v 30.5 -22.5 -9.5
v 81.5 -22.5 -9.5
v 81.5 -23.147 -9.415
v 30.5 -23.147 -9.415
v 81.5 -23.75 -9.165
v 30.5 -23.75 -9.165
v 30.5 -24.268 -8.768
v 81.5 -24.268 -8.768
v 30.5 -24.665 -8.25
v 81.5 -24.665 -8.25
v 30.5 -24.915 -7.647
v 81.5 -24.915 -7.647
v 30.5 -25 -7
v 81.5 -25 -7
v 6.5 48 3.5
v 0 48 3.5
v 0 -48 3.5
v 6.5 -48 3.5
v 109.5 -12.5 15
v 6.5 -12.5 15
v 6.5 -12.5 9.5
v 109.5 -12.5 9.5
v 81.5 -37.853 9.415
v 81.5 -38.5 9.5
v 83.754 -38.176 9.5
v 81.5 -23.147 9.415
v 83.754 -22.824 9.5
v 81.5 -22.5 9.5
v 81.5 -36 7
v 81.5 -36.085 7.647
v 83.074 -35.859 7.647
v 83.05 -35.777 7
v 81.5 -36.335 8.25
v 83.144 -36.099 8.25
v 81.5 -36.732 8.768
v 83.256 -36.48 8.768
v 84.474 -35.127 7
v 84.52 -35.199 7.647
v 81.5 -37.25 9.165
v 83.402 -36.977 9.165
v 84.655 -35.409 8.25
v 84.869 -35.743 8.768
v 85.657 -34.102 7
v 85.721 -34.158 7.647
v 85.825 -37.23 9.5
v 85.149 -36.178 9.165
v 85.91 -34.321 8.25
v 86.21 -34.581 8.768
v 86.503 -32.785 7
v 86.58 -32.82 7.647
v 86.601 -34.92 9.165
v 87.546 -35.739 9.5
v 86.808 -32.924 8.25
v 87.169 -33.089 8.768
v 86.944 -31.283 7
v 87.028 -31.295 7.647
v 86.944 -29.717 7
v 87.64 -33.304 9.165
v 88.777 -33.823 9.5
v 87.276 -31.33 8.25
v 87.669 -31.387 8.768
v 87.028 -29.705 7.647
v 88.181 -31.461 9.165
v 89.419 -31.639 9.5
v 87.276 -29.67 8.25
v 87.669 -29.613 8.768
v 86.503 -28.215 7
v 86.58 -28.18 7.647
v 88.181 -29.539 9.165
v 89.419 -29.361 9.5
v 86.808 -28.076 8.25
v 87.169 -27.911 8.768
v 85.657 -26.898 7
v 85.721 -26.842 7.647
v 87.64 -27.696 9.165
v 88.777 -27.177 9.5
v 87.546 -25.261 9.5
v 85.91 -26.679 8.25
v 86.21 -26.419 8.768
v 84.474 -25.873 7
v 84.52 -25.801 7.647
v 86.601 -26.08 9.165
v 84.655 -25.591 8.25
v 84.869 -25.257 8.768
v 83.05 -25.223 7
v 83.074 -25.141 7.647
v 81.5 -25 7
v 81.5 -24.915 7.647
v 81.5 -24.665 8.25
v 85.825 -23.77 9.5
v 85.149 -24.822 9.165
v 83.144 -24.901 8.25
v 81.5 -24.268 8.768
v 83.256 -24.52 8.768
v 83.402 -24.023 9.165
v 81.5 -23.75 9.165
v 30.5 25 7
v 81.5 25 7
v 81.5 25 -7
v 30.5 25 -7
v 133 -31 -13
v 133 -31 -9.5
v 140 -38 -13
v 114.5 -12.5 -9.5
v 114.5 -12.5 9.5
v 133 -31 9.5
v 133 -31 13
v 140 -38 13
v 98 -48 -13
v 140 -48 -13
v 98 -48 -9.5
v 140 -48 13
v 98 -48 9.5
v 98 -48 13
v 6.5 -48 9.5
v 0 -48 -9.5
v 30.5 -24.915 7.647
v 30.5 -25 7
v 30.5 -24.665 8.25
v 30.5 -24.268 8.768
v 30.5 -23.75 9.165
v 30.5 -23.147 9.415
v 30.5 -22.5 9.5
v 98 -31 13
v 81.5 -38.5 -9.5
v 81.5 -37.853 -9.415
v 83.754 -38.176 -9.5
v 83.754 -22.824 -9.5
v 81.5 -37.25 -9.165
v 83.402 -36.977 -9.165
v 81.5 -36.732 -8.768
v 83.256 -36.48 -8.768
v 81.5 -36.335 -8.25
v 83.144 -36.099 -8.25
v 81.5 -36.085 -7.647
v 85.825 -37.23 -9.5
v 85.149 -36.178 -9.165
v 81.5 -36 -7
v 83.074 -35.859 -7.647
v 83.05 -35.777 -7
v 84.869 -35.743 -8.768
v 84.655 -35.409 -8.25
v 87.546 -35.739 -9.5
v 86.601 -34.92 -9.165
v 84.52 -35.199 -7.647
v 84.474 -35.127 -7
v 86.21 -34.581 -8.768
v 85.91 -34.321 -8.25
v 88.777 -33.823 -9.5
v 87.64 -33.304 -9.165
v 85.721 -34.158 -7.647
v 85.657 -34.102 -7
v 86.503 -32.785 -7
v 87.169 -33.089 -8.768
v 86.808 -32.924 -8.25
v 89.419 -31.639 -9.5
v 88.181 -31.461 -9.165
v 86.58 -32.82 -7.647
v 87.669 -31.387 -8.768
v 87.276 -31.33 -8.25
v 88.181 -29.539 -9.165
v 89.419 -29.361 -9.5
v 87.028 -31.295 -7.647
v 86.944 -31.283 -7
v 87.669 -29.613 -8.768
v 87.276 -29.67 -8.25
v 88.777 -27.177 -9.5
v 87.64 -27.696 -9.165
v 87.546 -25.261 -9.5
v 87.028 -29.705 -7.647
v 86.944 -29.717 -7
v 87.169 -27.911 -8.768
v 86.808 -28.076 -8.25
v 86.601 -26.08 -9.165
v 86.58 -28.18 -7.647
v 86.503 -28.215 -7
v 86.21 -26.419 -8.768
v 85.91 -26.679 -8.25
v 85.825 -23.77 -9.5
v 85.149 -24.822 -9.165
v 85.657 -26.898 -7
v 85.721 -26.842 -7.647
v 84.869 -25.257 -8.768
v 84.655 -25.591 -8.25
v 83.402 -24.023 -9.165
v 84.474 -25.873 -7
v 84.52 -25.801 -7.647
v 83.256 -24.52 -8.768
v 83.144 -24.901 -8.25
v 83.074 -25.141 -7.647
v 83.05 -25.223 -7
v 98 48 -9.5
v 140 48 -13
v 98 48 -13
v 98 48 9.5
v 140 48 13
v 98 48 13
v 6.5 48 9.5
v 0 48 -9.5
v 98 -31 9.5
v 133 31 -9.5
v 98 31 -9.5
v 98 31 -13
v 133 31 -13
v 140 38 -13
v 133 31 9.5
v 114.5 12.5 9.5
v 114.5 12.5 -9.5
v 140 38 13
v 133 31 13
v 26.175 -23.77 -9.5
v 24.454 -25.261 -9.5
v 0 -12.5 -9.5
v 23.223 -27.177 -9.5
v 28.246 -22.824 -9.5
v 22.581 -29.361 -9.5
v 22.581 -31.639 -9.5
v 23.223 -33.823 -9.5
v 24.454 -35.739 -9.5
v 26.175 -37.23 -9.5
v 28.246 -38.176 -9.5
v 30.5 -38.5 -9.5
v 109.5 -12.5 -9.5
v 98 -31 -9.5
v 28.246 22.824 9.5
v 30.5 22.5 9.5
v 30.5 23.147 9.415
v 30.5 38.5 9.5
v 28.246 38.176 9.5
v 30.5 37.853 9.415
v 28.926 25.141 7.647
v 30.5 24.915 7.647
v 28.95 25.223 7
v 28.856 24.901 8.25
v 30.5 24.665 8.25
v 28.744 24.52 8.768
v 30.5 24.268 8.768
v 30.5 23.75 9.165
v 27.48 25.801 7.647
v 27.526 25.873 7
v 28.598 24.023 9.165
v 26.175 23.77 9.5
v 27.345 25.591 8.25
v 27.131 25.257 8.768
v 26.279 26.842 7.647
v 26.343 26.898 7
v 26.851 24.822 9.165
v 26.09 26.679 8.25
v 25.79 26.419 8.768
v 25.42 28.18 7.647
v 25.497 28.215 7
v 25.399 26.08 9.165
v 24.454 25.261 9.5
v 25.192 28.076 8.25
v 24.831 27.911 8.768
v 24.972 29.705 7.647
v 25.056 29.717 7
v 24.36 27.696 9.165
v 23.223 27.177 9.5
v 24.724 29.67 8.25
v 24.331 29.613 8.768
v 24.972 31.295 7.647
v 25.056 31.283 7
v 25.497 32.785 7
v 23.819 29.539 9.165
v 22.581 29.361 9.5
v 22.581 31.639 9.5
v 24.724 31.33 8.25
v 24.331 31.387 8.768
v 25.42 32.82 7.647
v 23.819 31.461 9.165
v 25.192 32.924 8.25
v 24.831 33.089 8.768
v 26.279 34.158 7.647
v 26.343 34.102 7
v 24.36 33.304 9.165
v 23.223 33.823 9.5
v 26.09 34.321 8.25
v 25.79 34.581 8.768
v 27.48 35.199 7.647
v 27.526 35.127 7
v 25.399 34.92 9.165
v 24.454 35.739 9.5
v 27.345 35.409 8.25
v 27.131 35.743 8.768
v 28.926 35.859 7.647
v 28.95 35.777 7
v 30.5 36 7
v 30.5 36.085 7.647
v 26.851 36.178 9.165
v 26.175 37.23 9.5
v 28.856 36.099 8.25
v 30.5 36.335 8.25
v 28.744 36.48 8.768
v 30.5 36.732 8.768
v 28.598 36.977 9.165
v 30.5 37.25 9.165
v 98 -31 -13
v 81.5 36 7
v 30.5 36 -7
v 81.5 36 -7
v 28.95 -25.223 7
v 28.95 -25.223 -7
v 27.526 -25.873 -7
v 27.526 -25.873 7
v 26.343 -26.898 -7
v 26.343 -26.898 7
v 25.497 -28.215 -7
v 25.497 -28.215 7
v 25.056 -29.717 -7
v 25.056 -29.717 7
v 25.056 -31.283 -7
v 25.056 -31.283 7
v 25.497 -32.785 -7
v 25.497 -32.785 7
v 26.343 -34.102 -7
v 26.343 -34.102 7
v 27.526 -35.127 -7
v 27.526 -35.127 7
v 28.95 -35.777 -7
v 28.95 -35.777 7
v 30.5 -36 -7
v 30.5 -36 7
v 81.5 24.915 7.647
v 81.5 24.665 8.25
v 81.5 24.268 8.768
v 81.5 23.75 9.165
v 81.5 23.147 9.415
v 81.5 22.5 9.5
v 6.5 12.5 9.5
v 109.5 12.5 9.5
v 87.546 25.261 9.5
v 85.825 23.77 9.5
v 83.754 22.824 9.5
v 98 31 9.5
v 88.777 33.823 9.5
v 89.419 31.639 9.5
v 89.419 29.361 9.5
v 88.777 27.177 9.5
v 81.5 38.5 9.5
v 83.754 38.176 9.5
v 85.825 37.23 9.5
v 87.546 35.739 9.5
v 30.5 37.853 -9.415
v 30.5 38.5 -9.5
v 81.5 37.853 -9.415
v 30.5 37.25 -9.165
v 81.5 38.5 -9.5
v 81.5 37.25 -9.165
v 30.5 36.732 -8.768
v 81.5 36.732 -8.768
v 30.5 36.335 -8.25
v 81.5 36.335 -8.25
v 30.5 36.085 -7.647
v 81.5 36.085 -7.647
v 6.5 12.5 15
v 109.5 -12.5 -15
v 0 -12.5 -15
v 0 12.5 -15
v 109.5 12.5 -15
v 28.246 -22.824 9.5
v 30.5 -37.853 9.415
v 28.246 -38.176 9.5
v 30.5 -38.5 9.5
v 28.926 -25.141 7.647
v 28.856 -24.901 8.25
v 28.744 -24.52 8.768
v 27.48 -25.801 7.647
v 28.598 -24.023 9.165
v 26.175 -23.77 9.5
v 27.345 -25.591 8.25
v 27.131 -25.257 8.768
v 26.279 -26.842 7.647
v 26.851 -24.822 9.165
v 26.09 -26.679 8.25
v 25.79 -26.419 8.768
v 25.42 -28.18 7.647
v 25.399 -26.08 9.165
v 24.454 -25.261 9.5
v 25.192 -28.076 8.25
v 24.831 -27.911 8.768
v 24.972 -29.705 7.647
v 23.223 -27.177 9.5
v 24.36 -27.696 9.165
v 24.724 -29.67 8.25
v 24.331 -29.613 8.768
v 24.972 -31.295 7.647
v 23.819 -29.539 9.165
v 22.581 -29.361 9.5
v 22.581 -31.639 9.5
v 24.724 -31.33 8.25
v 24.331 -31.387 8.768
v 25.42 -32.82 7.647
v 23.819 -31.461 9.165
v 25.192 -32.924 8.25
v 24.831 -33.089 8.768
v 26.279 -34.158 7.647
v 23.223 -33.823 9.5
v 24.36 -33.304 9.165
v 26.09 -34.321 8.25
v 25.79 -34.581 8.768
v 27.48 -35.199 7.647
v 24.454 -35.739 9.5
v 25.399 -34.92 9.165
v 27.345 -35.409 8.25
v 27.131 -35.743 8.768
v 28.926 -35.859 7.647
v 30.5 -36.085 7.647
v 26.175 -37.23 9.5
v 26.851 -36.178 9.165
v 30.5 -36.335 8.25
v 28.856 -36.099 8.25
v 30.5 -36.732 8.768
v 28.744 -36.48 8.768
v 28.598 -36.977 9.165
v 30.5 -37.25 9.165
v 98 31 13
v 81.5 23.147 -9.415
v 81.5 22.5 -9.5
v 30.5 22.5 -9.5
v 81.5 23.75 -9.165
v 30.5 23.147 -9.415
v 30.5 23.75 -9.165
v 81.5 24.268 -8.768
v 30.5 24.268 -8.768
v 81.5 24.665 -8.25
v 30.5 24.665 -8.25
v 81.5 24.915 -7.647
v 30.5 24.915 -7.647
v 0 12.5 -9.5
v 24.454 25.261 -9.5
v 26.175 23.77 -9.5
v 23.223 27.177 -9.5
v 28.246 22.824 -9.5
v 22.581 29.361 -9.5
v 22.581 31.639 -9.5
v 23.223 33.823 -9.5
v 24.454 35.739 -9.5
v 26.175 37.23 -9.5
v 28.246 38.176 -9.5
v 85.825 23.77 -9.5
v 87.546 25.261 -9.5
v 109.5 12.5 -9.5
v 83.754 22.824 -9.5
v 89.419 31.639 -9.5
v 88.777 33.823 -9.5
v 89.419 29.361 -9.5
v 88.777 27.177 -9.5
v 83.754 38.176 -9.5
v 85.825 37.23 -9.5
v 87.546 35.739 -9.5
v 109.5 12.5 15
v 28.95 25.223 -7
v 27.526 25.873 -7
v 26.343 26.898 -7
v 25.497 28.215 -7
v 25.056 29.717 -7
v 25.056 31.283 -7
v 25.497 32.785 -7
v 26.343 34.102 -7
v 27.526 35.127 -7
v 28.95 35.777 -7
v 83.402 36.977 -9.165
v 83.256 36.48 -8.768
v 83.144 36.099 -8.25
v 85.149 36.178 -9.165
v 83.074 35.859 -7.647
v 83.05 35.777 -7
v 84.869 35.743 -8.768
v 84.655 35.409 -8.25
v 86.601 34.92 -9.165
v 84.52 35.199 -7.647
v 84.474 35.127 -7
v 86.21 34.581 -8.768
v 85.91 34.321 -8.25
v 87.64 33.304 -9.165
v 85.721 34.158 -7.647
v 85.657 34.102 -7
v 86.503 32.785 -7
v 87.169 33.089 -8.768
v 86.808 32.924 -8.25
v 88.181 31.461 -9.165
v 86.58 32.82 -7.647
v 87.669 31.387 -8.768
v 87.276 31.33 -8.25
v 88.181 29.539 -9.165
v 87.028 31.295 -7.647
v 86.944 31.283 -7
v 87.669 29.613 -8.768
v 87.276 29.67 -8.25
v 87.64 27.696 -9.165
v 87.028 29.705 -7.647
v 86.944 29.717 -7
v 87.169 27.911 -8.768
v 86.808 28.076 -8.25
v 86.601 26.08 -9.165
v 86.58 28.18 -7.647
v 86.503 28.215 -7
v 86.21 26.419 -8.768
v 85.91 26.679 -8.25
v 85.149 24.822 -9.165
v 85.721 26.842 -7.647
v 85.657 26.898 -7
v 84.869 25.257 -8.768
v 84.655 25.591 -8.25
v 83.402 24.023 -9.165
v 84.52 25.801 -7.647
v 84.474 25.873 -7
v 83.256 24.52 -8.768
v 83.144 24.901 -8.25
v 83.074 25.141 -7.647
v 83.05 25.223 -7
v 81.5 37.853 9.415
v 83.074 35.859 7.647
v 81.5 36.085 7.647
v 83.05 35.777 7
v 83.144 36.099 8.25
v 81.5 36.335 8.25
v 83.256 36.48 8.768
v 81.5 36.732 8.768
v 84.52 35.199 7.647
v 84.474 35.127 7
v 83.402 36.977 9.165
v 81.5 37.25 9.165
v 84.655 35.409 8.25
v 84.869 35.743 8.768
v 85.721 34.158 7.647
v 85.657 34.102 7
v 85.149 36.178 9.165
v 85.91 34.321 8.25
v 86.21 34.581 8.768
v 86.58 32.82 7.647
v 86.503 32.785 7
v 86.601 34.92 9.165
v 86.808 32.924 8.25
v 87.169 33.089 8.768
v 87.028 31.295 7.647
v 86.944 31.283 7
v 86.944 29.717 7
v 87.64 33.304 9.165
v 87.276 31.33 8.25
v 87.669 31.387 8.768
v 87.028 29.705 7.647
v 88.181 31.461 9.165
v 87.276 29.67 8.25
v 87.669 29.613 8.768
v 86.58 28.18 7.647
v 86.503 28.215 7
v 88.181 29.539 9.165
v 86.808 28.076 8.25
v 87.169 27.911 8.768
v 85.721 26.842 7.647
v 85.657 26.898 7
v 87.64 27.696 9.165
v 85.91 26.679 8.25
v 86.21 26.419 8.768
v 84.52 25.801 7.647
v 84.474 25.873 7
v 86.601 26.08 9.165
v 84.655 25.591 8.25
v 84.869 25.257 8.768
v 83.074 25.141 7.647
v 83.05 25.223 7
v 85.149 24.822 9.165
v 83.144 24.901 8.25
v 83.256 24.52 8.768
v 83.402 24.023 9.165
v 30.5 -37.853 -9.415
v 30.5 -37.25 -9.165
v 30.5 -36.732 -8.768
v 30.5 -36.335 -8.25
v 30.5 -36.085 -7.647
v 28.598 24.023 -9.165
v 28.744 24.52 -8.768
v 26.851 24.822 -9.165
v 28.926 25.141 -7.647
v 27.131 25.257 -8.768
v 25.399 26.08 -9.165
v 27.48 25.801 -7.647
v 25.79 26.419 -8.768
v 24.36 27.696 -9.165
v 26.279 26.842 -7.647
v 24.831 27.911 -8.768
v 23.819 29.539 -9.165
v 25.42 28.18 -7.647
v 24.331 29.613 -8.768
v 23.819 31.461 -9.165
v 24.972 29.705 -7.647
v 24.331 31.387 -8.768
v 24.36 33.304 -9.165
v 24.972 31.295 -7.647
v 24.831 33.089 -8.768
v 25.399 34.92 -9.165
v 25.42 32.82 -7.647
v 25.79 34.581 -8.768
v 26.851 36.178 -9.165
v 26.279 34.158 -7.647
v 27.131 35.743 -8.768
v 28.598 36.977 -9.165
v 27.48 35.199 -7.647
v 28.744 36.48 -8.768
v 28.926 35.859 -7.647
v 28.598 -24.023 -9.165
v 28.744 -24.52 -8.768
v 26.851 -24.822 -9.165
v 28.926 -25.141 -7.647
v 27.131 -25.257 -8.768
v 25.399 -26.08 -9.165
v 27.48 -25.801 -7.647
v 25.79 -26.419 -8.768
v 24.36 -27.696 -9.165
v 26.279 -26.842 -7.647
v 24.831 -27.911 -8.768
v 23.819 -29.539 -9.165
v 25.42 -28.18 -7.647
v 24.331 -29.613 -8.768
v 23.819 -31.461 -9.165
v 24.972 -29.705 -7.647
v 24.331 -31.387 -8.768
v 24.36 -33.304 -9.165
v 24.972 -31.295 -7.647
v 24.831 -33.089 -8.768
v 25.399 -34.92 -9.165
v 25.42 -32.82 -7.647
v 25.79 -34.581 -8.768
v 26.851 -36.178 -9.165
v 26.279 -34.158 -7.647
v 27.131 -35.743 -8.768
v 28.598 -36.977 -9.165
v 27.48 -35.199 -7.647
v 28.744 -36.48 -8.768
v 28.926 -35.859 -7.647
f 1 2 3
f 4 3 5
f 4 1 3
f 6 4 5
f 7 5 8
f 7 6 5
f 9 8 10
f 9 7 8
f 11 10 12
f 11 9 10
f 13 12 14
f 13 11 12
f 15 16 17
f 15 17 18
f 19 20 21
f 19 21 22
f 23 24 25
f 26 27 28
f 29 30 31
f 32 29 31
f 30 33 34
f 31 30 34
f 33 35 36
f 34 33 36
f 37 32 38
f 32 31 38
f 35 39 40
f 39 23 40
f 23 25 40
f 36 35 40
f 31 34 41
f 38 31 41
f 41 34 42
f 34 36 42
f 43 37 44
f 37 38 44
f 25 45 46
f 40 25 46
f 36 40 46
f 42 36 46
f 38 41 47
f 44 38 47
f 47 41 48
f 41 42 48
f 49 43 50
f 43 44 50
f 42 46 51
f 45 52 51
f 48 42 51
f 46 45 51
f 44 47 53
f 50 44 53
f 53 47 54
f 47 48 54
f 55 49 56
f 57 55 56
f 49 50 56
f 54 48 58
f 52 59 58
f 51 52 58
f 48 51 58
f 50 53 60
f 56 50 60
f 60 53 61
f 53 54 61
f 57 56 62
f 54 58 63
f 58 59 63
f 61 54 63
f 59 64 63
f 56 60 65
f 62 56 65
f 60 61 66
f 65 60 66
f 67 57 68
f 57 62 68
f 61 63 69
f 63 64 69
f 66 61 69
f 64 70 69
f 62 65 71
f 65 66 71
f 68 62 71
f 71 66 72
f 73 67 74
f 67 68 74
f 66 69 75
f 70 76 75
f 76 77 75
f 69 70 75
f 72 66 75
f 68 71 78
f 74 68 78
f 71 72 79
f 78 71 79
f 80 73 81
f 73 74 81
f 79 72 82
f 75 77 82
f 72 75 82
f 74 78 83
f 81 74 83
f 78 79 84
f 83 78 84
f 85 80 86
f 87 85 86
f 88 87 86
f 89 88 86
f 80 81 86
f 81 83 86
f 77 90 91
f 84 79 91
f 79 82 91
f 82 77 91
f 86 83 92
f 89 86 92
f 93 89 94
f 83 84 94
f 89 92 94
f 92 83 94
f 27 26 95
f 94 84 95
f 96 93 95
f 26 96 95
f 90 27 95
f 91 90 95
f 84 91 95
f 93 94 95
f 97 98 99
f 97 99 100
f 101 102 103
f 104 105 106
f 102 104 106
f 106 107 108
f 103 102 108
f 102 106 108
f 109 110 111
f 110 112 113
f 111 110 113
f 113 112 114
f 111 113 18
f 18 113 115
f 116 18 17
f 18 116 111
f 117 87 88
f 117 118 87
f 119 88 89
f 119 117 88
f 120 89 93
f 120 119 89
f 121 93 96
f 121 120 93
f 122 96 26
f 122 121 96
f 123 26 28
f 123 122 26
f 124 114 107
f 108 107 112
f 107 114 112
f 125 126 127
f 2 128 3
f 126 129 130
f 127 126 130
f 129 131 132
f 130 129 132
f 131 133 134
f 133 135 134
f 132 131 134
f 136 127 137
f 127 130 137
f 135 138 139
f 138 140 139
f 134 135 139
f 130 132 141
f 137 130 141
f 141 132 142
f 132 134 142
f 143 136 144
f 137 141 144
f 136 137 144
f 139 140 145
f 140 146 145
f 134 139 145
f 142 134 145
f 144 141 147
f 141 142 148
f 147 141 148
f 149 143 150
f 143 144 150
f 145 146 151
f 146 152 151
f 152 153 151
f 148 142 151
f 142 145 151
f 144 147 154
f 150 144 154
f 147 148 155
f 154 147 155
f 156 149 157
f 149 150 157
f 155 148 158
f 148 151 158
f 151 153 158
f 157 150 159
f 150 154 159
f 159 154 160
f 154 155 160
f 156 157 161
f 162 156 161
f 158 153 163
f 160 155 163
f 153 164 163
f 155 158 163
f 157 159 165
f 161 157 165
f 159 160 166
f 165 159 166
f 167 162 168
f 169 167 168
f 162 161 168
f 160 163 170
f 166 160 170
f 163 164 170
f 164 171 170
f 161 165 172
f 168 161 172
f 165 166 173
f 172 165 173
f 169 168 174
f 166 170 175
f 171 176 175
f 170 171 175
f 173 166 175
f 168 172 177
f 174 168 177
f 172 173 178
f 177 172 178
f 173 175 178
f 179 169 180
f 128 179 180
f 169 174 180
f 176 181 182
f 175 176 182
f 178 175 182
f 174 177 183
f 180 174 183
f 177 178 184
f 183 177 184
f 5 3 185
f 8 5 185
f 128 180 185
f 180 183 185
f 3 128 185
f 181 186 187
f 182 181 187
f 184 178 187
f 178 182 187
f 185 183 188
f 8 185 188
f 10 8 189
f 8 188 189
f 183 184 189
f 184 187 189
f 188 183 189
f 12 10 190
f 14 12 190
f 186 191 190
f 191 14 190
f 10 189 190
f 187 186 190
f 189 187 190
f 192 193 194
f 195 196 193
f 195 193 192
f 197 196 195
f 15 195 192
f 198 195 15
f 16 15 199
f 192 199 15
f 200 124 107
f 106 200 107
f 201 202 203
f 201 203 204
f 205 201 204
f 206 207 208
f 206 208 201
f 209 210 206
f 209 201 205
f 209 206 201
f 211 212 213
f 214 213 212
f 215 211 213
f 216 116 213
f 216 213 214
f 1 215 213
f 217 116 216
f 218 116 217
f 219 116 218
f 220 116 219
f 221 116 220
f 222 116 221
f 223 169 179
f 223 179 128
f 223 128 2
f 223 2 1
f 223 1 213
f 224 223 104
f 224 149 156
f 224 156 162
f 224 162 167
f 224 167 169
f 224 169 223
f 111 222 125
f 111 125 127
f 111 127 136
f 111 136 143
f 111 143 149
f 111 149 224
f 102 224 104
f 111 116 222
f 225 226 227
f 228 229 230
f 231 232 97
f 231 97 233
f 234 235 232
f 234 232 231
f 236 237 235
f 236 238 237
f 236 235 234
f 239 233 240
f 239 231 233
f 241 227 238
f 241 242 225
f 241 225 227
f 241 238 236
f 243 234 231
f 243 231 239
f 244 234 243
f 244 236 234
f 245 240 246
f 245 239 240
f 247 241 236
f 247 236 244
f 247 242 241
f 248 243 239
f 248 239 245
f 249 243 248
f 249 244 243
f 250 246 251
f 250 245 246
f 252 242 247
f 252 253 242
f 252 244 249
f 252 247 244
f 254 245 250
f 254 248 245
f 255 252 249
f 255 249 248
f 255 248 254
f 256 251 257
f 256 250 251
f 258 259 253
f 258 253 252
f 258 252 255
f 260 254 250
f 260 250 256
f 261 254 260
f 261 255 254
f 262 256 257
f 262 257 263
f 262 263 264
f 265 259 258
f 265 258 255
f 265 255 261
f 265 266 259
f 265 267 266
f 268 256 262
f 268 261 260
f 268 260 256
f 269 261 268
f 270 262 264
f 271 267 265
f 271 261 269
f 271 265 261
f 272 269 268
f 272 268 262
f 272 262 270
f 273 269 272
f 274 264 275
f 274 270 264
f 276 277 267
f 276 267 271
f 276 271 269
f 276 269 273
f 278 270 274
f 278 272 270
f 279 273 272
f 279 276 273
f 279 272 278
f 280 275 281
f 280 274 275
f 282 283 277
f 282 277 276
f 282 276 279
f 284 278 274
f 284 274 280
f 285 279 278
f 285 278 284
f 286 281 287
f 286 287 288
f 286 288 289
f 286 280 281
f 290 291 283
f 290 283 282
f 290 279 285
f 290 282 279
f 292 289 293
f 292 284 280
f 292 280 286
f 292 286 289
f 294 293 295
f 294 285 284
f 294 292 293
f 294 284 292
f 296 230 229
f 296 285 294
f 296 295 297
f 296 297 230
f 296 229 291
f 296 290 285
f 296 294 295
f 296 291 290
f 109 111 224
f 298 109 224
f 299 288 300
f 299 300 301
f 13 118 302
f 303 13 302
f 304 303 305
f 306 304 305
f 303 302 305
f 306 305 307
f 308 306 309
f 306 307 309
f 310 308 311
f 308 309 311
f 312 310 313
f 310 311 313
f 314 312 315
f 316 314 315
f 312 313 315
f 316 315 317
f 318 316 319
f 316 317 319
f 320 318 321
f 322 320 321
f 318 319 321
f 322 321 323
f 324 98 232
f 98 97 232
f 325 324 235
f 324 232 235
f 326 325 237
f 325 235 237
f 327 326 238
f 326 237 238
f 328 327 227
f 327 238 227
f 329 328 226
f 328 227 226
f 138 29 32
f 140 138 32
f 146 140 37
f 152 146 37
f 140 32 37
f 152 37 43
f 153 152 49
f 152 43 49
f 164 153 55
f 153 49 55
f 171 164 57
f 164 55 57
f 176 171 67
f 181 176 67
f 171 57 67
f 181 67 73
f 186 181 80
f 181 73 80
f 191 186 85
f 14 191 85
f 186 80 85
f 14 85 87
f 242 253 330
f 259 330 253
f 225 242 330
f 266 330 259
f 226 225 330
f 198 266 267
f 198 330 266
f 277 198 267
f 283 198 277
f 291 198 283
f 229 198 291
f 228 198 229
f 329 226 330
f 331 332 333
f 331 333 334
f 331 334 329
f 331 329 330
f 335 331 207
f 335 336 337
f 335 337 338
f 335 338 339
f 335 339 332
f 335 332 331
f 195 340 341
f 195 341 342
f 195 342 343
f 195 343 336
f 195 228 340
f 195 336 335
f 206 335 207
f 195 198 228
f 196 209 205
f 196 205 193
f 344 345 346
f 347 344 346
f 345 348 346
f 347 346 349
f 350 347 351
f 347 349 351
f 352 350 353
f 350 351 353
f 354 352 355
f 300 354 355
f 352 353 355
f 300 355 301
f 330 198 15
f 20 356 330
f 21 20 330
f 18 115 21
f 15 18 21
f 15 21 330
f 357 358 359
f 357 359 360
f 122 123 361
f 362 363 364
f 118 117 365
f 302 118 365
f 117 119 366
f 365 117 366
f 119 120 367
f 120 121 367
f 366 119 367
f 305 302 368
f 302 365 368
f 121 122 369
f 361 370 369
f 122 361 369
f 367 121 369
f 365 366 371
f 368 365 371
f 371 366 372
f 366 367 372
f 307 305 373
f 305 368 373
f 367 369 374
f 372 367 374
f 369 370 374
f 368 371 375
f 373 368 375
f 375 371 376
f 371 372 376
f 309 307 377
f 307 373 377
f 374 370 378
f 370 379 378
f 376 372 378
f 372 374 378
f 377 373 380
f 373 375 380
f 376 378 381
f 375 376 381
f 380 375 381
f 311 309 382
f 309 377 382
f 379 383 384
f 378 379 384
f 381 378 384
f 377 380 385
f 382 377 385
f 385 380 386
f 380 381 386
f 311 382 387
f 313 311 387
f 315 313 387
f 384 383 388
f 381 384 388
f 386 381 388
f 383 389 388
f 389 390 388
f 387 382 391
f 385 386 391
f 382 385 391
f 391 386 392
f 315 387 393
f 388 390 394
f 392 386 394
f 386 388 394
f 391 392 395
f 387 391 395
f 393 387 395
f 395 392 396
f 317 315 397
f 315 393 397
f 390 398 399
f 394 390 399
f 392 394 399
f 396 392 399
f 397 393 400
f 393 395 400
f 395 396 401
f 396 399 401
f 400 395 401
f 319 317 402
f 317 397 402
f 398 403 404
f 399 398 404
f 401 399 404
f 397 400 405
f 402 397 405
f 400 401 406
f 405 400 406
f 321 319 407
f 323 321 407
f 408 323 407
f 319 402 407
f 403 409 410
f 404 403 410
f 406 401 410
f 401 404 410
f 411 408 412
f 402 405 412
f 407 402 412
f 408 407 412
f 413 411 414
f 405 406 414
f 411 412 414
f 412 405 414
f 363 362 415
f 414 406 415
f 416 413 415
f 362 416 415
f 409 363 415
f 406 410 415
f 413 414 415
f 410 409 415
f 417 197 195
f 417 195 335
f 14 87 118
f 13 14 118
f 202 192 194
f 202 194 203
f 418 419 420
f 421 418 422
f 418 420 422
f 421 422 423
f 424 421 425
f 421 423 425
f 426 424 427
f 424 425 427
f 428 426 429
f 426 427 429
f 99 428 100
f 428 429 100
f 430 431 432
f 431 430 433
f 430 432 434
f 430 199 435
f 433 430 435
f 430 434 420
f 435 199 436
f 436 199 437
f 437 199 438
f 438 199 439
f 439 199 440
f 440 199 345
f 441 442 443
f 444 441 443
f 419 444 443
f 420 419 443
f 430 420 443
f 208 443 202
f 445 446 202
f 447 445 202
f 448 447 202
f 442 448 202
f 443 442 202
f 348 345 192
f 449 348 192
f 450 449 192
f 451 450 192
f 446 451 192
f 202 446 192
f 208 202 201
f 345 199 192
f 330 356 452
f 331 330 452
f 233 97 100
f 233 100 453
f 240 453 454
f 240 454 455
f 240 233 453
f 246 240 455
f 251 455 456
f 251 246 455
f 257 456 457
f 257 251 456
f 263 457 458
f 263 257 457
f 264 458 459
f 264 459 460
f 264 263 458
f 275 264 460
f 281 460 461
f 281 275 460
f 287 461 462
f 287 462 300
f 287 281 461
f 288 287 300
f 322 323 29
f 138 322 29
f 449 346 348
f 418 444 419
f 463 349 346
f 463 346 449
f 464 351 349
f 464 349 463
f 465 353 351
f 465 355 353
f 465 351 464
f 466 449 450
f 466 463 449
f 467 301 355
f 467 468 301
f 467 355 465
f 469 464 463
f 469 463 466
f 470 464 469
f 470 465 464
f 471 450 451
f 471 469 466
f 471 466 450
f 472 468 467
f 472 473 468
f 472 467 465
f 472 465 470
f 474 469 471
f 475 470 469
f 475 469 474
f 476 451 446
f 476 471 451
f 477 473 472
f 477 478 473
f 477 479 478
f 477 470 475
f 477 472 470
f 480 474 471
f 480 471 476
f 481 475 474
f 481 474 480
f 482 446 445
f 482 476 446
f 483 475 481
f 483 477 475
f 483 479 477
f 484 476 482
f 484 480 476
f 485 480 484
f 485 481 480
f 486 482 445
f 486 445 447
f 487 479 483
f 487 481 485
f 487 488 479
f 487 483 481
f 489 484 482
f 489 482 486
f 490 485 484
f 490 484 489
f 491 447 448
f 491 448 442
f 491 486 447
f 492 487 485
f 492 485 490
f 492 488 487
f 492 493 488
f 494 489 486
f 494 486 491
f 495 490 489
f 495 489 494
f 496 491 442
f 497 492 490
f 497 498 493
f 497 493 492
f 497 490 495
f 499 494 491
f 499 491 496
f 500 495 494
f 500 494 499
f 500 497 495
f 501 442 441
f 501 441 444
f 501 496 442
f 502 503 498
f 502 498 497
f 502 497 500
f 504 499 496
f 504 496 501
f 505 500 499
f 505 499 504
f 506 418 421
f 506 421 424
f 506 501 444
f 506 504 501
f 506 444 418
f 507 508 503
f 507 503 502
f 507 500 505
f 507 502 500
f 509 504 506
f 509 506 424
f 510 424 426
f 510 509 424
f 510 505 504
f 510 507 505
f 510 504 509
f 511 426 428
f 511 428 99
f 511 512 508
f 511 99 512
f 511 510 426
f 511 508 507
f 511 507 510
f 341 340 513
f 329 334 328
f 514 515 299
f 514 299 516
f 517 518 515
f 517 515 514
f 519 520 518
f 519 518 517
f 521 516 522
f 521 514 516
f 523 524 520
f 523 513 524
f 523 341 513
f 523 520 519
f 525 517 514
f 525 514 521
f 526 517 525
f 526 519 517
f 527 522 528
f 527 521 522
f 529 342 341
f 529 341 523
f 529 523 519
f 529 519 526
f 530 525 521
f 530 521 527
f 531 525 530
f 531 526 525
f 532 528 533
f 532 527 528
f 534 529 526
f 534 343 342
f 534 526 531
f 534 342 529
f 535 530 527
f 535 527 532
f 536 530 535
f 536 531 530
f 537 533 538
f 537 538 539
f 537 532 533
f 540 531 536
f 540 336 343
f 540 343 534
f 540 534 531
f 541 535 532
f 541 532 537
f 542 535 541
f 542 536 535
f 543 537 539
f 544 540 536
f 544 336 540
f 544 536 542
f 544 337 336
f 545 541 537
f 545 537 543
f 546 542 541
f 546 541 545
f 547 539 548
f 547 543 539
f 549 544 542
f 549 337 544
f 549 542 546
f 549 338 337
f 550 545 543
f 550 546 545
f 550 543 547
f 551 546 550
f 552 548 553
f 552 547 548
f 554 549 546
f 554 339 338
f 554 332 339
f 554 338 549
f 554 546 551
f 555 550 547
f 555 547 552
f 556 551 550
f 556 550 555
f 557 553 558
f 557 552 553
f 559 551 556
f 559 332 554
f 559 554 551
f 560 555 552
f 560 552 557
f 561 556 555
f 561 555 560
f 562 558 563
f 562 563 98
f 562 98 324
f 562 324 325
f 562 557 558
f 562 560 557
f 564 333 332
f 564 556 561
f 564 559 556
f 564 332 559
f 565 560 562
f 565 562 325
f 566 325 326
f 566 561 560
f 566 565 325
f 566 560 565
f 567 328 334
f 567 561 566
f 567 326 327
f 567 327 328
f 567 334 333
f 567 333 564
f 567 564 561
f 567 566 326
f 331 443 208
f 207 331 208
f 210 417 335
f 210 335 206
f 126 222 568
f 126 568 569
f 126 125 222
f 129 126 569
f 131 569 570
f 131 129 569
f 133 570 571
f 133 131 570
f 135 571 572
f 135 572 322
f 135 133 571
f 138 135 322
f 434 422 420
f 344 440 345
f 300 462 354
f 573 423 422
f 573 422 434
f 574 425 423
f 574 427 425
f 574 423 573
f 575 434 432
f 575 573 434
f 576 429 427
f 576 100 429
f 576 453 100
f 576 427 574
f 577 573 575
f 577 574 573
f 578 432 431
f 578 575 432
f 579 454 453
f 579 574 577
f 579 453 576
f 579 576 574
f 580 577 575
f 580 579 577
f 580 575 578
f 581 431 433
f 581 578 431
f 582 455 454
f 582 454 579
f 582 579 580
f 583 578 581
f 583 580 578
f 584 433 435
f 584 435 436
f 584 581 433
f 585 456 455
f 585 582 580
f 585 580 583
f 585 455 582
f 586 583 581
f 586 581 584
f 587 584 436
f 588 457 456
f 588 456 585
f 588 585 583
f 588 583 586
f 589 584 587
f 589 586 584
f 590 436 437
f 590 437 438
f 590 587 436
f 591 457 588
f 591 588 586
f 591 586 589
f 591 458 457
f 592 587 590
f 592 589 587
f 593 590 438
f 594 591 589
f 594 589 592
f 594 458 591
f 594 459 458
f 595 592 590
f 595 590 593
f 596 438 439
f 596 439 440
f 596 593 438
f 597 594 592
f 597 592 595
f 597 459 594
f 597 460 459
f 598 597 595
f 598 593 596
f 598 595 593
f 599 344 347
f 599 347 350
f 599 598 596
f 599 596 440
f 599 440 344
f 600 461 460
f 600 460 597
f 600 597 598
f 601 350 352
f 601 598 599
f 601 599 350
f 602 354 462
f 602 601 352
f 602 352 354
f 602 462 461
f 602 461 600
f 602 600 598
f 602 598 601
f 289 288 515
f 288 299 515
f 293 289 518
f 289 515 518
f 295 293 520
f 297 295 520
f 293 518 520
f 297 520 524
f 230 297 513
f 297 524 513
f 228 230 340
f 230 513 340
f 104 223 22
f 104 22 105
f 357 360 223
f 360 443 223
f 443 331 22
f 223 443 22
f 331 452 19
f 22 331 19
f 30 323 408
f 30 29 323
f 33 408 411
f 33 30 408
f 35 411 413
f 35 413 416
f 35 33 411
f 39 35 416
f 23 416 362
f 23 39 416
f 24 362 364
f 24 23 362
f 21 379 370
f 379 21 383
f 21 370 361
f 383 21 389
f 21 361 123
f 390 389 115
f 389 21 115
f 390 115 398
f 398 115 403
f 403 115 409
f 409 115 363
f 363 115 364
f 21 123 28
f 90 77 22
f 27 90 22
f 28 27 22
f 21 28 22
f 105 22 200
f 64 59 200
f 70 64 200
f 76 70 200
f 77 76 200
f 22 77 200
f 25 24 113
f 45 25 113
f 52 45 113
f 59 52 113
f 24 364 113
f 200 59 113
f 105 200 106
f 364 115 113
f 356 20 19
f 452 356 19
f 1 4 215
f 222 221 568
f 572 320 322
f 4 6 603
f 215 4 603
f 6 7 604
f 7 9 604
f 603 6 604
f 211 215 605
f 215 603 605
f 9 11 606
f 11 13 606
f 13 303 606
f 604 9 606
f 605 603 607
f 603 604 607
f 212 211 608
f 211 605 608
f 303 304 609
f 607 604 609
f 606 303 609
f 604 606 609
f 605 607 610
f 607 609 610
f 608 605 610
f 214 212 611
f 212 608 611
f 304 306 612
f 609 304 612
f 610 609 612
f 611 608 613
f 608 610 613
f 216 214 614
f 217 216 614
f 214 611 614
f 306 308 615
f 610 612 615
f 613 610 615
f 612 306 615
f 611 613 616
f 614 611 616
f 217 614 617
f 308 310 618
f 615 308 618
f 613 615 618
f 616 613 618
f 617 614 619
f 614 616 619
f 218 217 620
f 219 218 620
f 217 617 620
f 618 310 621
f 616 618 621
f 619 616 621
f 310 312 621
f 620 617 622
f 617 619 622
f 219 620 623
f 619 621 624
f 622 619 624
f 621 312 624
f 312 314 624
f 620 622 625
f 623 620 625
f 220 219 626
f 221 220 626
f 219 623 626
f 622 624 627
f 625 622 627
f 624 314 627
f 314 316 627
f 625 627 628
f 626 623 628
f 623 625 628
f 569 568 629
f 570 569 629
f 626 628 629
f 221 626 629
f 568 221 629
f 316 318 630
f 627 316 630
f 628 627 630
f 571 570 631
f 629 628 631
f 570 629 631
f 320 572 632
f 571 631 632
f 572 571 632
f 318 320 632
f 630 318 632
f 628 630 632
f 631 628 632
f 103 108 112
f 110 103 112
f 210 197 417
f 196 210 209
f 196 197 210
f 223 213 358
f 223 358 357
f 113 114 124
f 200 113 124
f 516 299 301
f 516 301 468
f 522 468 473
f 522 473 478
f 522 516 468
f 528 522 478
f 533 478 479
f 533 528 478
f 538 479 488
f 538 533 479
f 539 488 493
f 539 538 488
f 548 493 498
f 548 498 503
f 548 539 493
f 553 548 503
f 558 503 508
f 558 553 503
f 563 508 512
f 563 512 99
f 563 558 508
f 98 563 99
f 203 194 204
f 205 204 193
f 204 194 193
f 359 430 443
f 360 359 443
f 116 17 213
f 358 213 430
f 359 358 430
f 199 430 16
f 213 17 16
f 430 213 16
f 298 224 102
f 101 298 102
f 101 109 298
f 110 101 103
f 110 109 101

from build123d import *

# Parameters (mm, degrees)
SKETCH1_W           = 109.5
SKETCH1_H           = 12.5
BOSS_EXTRUDE1_DEPTH = 15
BOSS_EXTRUDE2_DEPTH = 9.5
BOSS_EXTRUDE3_DEPTH = 13
SKETCH2_W           = 6.5
SKETCH2_H           = 11.5
CUT_EXTRUDE1_DEPTH  = 149.758193052
FILLET1_R           = 2.5


with BuildPart() as part:
    # Sketch1 → Boss-Extrude1 (new, symmetric)
    with BuildSketch(Plane.XY):
        with Locations((54.75, 6.25)):
            Rectangle(SKETCH1_W, SKETCH1_H)
    extrude(amount=BOSS_EXTRUDE1_DEPTH, both=True)

    # Sketch1<3> → Boss-Extrude2 (add, symmetric)
    with BuildSketch(Plane.XY):
        Polygon((0, 12.5), (109.5, 12.5), (114.5, 12.5), (133, 31), (98, 31), (98, 48), (0, 48), align=None)
        with BuildLine():
            ThreePointArc((30.5, 25), (25, 30.5), (30.5, 36))
            Line((30.5, 36), (81.5, 36))
            ThreePointArc((81.5, 36), (87, 30.5), (81.5, 25))
            Line((81.5, 25), (30.5, 25))
        make_face(mode=Mode.SUBTRACT)
    extrude(amount=BOSS_EXTRUDE2_DEPTH, both=True)

    # Sketch1<4> → Boss-Extrude3 (add, symmetric)
    with BuildSketch(Plane.XY):
        Polygon((98, 31), (133, 31), (140, 38), (140, 48), (98, 48), align=None)
    extrude(amount=BOSS_EXTRUDE3_DEPTH, both=True)

    # Sketch2 → Cut-Extrude1 (cut, through all)
    with BuildSketch(Plane(origin=(0, 48, 0), x_dir=(1, 0, 0), z_dir=(0, 1, 0))):
        with Locations((3.25, -9.25)):
            Rectangle(SKETCH2_W, SKETCH2_H)
    extrude(amount=-CUT_EXTRUDE1_DEPTH, mode=Mode.SUBTRACT)

    # Fillet1
    fillet1_edges = [part.edges().sort_by_distance(p)[0] for p in [
        (87, 30.5, 9.5),
        (56, 25, 9.5),
        (25, 30.5, 9.5),
        (56, 36, -9.5),
        (56, 36, 9.5),
        (87, 30.5, -9.5),
        (25, 30.5, -9.5),
        (56, 25, -9.5),
    ]]
    fillet(fillet1_edges, radius=FILLET1_R)

    # Mirror2: part across plane


with BuildPart() as part_1:
    add(part.part)
    add(part.part.mirror(Plane(origin=(0, 0, 15), x_dir=(0, 0, 1), z_dir=(0, -1, 0))))


solid = part_1.part
